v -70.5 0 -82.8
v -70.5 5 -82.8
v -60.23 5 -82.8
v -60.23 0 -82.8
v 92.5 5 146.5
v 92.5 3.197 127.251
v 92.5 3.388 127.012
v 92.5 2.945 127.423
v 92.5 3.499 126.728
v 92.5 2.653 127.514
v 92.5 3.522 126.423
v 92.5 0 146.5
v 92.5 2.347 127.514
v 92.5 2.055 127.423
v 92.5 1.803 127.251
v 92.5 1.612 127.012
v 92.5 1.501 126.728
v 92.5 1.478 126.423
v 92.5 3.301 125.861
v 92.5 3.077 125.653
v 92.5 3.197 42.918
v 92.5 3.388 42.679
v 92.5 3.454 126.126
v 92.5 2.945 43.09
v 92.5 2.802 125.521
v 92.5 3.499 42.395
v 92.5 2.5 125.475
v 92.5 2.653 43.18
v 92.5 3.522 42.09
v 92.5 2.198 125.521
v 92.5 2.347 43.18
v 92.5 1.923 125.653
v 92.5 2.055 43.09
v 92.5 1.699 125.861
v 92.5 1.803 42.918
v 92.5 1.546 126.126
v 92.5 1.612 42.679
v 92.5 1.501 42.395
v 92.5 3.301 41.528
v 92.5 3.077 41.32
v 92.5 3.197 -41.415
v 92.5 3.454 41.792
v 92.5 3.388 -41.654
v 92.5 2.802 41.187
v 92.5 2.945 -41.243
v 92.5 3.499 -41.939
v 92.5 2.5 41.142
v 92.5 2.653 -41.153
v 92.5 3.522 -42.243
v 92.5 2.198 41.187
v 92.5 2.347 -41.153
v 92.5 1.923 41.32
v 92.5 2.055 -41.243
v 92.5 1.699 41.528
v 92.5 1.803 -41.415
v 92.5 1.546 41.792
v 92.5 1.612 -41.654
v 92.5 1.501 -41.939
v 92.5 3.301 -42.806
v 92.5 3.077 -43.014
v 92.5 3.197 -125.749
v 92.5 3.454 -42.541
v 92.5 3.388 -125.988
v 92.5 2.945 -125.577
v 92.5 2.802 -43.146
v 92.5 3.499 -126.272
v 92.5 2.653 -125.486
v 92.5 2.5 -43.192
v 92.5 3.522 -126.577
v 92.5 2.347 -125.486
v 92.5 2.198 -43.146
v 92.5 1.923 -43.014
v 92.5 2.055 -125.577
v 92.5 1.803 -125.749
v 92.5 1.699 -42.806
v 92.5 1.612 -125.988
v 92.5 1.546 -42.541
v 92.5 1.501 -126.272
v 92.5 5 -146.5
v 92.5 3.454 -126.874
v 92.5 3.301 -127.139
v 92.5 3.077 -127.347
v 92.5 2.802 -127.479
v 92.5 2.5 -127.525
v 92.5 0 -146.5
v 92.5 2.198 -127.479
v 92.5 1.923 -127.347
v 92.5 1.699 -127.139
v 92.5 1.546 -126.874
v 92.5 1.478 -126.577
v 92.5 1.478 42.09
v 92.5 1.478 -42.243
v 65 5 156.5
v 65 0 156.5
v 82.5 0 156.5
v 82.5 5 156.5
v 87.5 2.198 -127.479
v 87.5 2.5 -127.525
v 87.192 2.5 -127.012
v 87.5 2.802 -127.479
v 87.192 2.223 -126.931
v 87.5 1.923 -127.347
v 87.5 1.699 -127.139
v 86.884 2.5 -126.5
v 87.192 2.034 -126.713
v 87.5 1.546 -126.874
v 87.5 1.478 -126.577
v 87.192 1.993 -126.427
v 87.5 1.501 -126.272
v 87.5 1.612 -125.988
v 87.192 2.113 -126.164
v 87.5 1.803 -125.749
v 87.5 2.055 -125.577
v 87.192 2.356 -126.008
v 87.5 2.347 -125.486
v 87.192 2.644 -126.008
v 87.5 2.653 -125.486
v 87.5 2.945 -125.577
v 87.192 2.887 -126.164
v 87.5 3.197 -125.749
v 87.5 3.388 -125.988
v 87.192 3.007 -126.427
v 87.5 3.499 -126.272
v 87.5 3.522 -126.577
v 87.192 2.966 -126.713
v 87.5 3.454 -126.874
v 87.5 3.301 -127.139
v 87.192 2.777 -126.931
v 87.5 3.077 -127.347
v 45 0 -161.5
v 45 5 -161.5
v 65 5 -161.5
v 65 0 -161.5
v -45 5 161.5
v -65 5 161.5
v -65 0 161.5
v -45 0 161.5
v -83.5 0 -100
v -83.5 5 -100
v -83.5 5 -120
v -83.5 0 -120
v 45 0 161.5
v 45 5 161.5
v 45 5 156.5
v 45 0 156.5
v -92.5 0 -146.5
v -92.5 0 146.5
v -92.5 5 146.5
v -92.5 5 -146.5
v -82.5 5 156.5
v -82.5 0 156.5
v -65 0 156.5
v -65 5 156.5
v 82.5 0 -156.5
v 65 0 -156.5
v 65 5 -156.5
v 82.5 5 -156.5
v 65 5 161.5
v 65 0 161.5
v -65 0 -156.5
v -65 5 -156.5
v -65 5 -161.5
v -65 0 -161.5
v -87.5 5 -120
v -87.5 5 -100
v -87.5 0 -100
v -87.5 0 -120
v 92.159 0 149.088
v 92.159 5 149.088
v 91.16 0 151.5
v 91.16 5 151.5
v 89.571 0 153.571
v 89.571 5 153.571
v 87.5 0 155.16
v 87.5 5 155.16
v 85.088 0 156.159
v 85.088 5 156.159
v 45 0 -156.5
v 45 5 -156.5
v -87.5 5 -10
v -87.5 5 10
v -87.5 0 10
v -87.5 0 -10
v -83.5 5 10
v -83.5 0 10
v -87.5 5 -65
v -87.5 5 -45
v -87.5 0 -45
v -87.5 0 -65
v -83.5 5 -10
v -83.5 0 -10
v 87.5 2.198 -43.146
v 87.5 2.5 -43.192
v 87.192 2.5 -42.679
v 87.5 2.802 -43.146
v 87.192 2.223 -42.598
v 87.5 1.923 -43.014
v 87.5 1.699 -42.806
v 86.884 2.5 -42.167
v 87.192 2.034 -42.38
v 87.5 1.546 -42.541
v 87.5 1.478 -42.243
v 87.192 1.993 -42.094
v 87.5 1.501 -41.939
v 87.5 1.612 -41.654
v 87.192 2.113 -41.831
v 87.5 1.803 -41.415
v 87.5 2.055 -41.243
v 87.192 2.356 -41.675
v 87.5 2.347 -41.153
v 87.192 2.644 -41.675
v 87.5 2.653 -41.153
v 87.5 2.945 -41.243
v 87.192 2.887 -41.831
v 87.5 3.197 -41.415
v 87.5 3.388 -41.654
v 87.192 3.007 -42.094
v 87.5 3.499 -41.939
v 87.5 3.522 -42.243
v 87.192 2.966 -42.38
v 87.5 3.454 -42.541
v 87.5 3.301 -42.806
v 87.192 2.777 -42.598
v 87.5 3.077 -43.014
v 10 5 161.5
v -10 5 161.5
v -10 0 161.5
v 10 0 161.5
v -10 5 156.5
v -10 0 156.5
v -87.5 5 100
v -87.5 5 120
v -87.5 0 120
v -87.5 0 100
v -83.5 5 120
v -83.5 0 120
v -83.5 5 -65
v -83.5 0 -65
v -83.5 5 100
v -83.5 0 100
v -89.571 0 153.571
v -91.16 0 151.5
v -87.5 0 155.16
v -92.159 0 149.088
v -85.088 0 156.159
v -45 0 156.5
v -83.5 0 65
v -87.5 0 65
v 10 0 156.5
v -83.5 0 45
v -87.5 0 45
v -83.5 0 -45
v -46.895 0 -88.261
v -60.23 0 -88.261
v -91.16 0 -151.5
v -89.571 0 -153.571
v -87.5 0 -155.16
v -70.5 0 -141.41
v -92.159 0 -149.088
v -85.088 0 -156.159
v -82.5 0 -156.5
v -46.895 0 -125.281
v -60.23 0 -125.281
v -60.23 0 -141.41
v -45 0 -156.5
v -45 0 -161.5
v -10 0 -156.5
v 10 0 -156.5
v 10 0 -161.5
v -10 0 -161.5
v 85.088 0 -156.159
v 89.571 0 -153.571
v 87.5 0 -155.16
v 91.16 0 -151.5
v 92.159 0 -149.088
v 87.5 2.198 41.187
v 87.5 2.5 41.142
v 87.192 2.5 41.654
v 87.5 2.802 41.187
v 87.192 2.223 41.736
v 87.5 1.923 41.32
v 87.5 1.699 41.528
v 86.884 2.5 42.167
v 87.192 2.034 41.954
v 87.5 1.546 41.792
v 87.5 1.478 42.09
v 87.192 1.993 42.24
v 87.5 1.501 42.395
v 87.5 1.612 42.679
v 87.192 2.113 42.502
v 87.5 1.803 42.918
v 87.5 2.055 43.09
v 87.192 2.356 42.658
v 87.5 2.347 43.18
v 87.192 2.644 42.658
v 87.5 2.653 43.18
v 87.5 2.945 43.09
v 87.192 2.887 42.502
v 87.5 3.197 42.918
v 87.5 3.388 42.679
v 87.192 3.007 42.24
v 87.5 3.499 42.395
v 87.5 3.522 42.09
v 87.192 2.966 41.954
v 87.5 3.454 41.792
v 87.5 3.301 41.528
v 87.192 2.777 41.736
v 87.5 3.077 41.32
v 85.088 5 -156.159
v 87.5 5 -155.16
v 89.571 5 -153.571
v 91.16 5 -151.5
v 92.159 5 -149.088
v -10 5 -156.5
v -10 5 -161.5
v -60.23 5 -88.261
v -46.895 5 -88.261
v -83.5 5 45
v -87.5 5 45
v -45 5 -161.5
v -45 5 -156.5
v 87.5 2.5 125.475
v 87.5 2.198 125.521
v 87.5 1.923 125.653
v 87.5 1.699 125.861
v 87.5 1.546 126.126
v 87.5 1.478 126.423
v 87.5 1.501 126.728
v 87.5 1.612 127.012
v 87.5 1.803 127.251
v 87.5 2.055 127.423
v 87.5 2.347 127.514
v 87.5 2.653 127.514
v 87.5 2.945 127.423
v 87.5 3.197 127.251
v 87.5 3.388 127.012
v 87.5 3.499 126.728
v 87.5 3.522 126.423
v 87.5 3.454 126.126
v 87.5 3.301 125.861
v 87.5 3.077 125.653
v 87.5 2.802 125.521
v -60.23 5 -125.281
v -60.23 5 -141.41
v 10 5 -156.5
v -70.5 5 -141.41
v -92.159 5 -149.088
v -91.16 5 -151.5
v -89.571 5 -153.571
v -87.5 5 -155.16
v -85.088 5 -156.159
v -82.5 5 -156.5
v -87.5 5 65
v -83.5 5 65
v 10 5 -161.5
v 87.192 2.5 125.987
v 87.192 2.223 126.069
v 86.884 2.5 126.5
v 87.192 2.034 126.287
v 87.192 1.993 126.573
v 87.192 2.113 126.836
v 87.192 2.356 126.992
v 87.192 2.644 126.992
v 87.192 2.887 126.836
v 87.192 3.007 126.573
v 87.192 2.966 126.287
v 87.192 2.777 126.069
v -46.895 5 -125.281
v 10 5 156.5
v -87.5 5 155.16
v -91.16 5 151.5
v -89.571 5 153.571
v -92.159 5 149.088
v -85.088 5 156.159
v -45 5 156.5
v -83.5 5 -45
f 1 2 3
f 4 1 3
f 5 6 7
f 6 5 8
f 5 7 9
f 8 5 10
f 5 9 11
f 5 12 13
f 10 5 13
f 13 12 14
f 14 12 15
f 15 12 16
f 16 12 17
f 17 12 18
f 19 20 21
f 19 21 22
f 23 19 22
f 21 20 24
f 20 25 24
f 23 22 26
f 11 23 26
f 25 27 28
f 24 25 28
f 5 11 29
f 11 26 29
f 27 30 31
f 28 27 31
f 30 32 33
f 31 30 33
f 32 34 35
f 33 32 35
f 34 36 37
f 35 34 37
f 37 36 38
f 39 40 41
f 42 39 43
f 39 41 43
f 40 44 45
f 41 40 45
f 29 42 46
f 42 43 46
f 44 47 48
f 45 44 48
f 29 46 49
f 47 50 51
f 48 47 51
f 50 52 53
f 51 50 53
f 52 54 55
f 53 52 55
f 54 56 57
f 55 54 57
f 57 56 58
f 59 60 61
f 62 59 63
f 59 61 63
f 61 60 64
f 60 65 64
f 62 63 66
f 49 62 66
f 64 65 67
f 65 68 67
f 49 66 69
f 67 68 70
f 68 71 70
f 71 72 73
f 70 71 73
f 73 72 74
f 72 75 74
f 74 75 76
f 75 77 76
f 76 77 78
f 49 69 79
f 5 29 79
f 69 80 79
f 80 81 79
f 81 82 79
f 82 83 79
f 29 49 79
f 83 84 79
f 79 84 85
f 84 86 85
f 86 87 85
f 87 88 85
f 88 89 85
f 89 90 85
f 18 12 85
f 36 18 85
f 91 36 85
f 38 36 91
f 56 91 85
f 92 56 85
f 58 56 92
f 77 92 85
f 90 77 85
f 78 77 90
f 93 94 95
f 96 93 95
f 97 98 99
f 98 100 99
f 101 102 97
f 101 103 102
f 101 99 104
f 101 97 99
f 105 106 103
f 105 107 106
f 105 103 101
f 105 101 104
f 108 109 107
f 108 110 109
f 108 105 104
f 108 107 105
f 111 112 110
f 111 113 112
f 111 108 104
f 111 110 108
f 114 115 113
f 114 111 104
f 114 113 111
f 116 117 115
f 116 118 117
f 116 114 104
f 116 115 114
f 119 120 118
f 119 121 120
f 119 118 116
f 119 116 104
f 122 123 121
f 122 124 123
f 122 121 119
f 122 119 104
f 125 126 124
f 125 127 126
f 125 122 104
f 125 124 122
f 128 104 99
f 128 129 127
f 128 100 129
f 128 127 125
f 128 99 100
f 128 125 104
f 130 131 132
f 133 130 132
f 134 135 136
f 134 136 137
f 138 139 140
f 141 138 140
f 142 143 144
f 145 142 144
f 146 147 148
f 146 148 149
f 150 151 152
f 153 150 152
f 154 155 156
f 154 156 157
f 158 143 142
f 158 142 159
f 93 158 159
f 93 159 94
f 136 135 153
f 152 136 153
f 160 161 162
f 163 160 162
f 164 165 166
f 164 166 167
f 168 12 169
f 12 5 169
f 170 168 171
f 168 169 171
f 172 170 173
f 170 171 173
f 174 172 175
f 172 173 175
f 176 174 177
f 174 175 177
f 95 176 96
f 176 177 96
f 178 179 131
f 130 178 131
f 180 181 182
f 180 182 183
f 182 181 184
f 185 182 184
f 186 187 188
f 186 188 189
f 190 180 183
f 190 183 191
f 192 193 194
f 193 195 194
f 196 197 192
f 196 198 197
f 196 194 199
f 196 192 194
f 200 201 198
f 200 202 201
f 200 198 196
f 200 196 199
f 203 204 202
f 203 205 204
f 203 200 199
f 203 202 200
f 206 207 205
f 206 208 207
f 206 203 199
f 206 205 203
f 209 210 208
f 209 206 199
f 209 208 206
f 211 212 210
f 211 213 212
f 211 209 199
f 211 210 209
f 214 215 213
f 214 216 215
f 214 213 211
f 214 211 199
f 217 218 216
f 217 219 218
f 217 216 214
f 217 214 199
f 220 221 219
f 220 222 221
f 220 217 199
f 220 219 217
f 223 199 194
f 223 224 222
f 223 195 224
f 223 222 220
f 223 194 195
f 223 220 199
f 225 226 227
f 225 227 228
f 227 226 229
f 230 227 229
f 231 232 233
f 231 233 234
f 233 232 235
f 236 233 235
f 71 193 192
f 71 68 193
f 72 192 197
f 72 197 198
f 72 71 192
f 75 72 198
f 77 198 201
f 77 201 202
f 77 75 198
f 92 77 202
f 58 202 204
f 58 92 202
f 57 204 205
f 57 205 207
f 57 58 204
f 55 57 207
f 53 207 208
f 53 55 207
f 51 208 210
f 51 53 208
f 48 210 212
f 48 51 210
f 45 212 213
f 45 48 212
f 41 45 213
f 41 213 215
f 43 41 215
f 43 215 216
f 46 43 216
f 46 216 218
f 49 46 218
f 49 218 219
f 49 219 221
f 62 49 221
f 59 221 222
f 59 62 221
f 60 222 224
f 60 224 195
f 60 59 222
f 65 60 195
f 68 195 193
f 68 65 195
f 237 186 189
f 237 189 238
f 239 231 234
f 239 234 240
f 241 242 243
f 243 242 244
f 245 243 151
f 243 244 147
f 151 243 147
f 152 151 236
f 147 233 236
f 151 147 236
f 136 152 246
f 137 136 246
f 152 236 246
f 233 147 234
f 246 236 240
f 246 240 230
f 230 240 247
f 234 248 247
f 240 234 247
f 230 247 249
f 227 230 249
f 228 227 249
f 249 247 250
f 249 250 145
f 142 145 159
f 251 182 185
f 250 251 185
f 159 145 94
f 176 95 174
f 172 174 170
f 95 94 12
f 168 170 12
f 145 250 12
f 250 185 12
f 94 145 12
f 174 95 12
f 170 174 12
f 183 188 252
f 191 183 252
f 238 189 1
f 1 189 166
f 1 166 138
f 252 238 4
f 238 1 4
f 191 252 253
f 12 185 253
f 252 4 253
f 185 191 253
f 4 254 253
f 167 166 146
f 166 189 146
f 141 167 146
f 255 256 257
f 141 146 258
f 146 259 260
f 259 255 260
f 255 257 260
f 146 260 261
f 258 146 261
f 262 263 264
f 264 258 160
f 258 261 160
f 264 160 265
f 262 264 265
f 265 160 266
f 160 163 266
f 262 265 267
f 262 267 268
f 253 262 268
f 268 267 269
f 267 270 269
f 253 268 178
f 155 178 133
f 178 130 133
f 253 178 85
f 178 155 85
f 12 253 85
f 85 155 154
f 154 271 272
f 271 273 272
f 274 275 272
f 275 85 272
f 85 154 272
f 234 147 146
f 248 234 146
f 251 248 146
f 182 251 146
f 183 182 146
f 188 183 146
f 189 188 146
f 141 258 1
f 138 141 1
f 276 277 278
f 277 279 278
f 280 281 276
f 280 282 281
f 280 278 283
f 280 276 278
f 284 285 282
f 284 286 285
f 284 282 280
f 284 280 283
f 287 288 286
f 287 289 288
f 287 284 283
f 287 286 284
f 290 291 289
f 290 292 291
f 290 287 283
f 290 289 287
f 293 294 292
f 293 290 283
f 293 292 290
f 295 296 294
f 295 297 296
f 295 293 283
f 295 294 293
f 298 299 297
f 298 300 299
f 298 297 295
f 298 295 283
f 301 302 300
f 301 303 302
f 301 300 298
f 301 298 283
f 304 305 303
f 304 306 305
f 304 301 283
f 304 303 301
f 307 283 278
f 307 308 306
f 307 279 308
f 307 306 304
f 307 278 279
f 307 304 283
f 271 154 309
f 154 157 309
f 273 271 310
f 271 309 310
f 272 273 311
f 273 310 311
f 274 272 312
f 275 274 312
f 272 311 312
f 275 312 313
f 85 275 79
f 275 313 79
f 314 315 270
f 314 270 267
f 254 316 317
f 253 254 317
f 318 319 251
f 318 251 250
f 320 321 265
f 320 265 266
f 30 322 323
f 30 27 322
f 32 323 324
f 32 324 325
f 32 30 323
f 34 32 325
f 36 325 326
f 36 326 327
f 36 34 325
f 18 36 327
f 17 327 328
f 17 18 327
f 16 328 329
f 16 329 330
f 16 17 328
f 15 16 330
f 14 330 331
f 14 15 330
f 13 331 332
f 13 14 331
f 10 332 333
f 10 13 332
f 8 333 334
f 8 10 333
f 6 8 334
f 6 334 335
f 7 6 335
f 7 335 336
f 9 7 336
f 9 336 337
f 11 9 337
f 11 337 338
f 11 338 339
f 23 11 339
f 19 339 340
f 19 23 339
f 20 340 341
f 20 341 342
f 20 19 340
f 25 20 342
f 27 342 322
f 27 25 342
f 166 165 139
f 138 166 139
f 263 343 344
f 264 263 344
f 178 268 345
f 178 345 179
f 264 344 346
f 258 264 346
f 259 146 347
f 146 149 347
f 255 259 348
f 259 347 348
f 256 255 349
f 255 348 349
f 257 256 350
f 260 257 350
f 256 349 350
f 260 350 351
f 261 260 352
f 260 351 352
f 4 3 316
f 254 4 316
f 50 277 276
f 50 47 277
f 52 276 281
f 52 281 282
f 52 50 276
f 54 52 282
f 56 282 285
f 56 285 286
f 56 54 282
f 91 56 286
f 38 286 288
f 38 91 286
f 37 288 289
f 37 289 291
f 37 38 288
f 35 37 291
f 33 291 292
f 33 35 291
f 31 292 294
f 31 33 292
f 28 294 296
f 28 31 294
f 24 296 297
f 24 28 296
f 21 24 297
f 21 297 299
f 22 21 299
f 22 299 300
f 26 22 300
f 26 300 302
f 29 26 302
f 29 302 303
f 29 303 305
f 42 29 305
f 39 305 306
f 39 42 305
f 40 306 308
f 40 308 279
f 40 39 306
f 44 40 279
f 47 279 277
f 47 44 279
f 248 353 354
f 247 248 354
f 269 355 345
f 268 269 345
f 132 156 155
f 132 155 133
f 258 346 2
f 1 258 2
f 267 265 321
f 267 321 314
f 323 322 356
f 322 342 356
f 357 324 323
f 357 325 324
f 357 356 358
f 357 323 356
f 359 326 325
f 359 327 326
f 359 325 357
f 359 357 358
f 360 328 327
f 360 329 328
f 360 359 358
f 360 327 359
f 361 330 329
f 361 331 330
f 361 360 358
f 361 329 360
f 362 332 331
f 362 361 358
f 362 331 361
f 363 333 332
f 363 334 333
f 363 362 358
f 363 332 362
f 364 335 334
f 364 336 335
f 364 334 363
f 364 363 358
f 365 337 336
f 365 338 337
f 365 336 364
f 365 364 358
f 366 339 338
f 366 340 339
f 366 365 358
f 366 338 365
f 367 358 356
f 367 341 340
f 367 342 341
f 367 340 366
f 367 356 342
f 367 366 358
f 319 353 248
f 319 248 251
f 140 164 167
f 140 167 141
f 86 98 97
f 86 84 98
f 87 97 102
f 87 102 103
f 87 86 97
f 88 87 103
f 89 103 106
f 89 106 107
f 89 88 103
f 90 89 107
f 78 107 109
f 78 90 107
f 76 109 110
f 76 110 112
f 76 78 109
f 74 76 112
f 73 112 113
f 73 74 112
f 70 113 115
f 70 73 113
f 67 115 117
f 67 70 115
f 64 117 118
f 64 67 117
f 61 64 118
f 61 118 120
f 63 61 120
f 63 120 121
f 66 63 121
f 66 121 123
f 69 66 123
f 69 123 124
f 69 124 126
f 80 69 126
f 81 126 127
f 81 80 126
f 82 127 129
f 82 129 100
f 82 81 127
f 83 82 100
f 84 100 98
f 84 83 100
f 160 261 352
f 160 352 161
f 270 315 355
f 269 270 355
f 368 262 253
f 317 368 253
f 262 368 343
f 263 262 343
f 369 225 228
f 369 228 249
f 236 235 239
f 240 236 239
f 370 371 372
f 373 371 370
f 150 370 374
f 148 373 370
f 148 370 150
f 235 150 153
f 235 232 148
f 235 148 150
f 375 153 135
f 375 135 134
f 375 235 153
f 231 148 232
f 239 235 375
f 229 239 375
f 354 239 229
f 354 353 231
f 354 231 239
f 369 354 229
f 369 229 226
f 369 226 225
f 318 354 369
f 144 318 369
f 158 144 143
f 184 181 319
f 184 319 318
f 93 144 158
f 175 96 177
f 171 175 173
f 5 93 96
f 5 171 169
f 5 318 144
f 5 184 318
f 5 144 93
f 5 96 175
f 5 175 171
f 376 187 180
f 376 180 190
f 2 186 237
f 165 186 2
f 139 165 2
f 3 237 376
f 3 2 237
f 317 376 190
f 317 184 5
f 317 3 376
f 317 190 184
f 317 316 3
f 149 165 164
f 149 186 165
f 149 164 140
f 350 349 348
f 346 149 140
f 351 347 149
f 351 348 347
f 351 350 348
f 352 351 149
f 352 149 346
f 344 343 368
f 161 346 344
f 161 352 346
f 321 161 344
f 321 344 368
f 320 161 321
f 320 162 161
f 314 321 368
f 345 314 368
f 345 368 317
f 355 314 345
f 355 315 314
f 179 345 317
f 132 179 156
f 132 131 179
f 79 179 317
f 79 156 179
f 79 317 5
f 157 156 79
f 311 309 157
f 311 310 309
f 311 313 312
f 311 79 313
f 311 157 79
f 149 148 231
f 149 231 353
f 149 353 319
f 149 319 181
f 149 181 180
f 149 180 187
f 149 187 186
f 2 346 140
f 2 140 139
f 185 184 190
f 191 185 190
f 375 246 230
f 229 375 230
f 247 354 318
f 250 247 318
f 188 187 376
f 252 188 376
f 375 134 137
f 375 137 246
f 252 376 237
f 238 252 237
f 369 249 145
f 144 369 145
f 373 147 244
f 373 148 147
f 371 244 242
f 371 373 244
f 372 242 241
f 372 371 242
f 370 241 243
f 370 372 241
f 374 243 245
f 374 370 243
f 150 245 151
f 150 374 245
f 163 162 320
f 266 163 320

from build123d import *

# Parameters (mm, degrees)
SKETCH1_W               = 185
SKETCH1_H               = 313
BASE_DEPTH              = 5
SKETCH2_W               = 20
SKETCH2_H               = 5
BOSS_EXTRUDE2_DEPTH     = 5
LPATTERN1_COUNT         = 2
LPATTERN1_PITCH         = 55
LPATTERN1_COL_COUNT     = 2
LPATTERN1_COL_PITCH     = 55
SKETCH3_W               = 4
SKETCH3_H               = 20
CUT_EXTRUDE1_DEPTH      = 187.181363192
LPATTERN2_COUNT         = 3
LPATTERN2_PITCH         = 55
LPATTERN2_COL_COUNT     = 3
LPATTERN2_COL_PITCH     = 55
FILLET1_R               = 10
MIRROR1_COPY_1_SKETCH_W = 20
MIRROR1_COPY_1_SKETCH_H = 5
MIRROR1_COPY_1_DEPTH    = 5
MIRROR1_COPY_2_SKETCH_W = 20
MIRROR1_COPY_2_SKETCH_H = 5
MIRROR1_COPY_2_DEPTH    = 5
CUT_EXTRUDE4_DEPTH      = 187.181363192
LPATTERN5_COUNT         = 4
LPATTERN5_PITCH         = 84.333333333
CUT_EXTRUDE5_DEPTH      = 187.181363192


with BuildPart() as part:
    # Sketch1 → Base (new body)
    with BuildSketch(Plane(origin=(0, 0, 0), x_dir=(1, 0, 0), z_dir=(0, 1, 0))):
        Rectangle(SKETCH1_W, SKETCH1_H)
    extrude(amount=BASE_DEPTH)

    # Sketch2 → Boss-Extrude2 (add)
    with BuildSketch(Plane(origin=(0, 5, 0), x_dir=(1, 0, 0), z_dir=(0, 1, 0))):
        with Locations((0, -159)):
            Rectangle(SKETCH2_W, SKETCH2_H)
    boss_extrude2 = extrude(amount=-BOSS_EXTRUDE2_DEPTH)

    # LPattern1: Boss-Extrude2 ×2
    with Locations(*[(-i * LPATTERN1_PITCH, 0, 0) for i in range(1, LPATTERN1_COUNT)]):
        add(boss_extrude2)

    # LPattern1 col: Boss-Extrude2 ×2
    with Locations(*[(i * LPATTERN1_COL_PITCH, 0, 0) for i in range(1, LPATTERN1_COL_COUNT)]):
        add(boss_extrude2)

    # Sketch3 → Cut-Extrude1 (cut, through all)
    with BuildSketch(Plane(origin=(0, 5, 0), x_dir=(1, 0, 0), z_dir=(0, 1, 0))):
        with Locations((-85.5, 0)):
            Rectangle(SKETCH3_W, SKETCH3_H)
    cut_extrude1 = extrude(amount=-CUT_EXTRUDE1_DEPTH, mode=Mode.SUBTRACT)

    # LPattern2: Cut-Extrude1 ×3
    with Locations(*[(0, 0, -i * LPATTERN2_PITCH) for i in range(1, LPATTERN2_COUNT)]):
        add(cut_extrude1, mode=Mode.SUBTRACT)

    # LPattern2 col: Cut-Extrude1 ×3
    with Locations(*[(0, 0, i * LPATTERN2_COL_PITCH) for i in range(1, LPATTERN2_COL_COUNT)]):
        add(cut_extrude1, mode=Mode.SUBTRACT)

    # Fillet1
    fillet1_edges = [part.edges().sort_by_distance(p)[0] for p in [
        (-92.5, 2.5, -156.5),
        (92.5, 2.5, -156.5),
        (92.5, 2.5, 156.5),
        (-92.5, 2.5, 156.5),
    ]]
    fillet(fillet1_edges, radius=FILLET1_R)

    # Mirror1: Boss-Extrude2 across plane
    add(boss_extrude2.mirror(Plane.XY))

    # Mirror1 copy 1 sketch → Mirror1 copy 1 (add)
    with BuildSketch(Plane(origin=(-55, 5, 0), x_dir=(1, 0, 0), z_dir=(0, 1, 0))):
        with Locations((0, 159)):
            Rectangle(MIRROR1_COPY_1_SKETCH_W, MIRROR1_COPY_1_SKETCH_H)
    extrude(amount=-MIRROR1_COPY_1_DEPTH)

    # Mirror1 copy 2 sketch → Mirror1 copy 2 (add)
    with BuildSketch(Plane(origin=(55, 5, 0), x_dir=(1, 0, 0), z_dir=(0, 1, 0))):
        with Locations((0, 159)):
            Rectangle(MIRROR1_COPY_2_SKETCH_W, MIRROR1_COPY_2_SKETCH_H)
    extrude(amount=-MIRROR1_COPY_2_DEPTH)

    # Sketch5 → Cut-Extrude4 (cut, through all)
    with BuildSketch(Plane(origin=(0, 5, 0), x_dir=(1, 0, 0), z_dir=(0, 1, 0))):
        Polygon((-63.667363032, 141.40999982), (-70.5, 141.40999982), (-70.5, 136.502092421), (-70.5, 82.79999982), (-60.23, 82.79999982), (-60.23, 88.26099982), (-49.211989258, 88.26099982), (-49.211989258, 101.65899982), (-62.23, 101.65899982), (-62.23, 105.27899982), (-46.895, 105.27899982), (-46.895, 125.28099982), (-60.23, 125.28099982), (-60.23, 133.244848009), (-60.23, 141.40999982), align=None)
    extrude(amount=-CUT_EXTRUDE4_DEPTH, mode=Mode.SUBTRACT)

    # Sketch8 → Tap Drill for M2.5x0.45 Tap1 (revolve, cut)
    with BuildSketch(Plane(origin=(92.5, 2.5, -126.5), x_dir=(0, 0, -1), z_dir=(0, 1, 0))):
        Polygon((0, 0), (0, 5.615882135), (1.025, 5), (1.025, 0), align=None)
    tap_drill_for_m2_5x0_45_tap1 = revolve(axis=Axis((98.85, 2.5, -126.5), (-1, 0, 0)), mode=Mode.SUBTRACT)

    # LPattern5: Tap Drill for M2.5x0.45 Tap1 ×4
    with Locations(*[(0, 0, i * LPATTERN5_PITCH) for i in range(1, LPATTERN5_COUNT)]):
        add(tap_drill_for_m2_5x0_45_tap1, mode=Mode.SUBTRACT)

    # Sketch9 → Cut-Extrude5 (cut, through all)
    with BuildSketch(Plane(origin=(0, 0, 0), x_dir=(-1, 0, 0), z_dir=(0, -1, 0))):
        Polygon((46.895, 105.27899982), (46.895, 88.26099982), (49.211989258, 88.26099982), (49.211989258, 101.65899982), (62.23, 101.65899982), (62.23, 105.27899982), (49.211989258, 105.27899982), align=None)
    extrude(amount=-CUT_EXTRUDE5_DEPTH, mode=Mode.SUBTRACT)


solid = part.part
